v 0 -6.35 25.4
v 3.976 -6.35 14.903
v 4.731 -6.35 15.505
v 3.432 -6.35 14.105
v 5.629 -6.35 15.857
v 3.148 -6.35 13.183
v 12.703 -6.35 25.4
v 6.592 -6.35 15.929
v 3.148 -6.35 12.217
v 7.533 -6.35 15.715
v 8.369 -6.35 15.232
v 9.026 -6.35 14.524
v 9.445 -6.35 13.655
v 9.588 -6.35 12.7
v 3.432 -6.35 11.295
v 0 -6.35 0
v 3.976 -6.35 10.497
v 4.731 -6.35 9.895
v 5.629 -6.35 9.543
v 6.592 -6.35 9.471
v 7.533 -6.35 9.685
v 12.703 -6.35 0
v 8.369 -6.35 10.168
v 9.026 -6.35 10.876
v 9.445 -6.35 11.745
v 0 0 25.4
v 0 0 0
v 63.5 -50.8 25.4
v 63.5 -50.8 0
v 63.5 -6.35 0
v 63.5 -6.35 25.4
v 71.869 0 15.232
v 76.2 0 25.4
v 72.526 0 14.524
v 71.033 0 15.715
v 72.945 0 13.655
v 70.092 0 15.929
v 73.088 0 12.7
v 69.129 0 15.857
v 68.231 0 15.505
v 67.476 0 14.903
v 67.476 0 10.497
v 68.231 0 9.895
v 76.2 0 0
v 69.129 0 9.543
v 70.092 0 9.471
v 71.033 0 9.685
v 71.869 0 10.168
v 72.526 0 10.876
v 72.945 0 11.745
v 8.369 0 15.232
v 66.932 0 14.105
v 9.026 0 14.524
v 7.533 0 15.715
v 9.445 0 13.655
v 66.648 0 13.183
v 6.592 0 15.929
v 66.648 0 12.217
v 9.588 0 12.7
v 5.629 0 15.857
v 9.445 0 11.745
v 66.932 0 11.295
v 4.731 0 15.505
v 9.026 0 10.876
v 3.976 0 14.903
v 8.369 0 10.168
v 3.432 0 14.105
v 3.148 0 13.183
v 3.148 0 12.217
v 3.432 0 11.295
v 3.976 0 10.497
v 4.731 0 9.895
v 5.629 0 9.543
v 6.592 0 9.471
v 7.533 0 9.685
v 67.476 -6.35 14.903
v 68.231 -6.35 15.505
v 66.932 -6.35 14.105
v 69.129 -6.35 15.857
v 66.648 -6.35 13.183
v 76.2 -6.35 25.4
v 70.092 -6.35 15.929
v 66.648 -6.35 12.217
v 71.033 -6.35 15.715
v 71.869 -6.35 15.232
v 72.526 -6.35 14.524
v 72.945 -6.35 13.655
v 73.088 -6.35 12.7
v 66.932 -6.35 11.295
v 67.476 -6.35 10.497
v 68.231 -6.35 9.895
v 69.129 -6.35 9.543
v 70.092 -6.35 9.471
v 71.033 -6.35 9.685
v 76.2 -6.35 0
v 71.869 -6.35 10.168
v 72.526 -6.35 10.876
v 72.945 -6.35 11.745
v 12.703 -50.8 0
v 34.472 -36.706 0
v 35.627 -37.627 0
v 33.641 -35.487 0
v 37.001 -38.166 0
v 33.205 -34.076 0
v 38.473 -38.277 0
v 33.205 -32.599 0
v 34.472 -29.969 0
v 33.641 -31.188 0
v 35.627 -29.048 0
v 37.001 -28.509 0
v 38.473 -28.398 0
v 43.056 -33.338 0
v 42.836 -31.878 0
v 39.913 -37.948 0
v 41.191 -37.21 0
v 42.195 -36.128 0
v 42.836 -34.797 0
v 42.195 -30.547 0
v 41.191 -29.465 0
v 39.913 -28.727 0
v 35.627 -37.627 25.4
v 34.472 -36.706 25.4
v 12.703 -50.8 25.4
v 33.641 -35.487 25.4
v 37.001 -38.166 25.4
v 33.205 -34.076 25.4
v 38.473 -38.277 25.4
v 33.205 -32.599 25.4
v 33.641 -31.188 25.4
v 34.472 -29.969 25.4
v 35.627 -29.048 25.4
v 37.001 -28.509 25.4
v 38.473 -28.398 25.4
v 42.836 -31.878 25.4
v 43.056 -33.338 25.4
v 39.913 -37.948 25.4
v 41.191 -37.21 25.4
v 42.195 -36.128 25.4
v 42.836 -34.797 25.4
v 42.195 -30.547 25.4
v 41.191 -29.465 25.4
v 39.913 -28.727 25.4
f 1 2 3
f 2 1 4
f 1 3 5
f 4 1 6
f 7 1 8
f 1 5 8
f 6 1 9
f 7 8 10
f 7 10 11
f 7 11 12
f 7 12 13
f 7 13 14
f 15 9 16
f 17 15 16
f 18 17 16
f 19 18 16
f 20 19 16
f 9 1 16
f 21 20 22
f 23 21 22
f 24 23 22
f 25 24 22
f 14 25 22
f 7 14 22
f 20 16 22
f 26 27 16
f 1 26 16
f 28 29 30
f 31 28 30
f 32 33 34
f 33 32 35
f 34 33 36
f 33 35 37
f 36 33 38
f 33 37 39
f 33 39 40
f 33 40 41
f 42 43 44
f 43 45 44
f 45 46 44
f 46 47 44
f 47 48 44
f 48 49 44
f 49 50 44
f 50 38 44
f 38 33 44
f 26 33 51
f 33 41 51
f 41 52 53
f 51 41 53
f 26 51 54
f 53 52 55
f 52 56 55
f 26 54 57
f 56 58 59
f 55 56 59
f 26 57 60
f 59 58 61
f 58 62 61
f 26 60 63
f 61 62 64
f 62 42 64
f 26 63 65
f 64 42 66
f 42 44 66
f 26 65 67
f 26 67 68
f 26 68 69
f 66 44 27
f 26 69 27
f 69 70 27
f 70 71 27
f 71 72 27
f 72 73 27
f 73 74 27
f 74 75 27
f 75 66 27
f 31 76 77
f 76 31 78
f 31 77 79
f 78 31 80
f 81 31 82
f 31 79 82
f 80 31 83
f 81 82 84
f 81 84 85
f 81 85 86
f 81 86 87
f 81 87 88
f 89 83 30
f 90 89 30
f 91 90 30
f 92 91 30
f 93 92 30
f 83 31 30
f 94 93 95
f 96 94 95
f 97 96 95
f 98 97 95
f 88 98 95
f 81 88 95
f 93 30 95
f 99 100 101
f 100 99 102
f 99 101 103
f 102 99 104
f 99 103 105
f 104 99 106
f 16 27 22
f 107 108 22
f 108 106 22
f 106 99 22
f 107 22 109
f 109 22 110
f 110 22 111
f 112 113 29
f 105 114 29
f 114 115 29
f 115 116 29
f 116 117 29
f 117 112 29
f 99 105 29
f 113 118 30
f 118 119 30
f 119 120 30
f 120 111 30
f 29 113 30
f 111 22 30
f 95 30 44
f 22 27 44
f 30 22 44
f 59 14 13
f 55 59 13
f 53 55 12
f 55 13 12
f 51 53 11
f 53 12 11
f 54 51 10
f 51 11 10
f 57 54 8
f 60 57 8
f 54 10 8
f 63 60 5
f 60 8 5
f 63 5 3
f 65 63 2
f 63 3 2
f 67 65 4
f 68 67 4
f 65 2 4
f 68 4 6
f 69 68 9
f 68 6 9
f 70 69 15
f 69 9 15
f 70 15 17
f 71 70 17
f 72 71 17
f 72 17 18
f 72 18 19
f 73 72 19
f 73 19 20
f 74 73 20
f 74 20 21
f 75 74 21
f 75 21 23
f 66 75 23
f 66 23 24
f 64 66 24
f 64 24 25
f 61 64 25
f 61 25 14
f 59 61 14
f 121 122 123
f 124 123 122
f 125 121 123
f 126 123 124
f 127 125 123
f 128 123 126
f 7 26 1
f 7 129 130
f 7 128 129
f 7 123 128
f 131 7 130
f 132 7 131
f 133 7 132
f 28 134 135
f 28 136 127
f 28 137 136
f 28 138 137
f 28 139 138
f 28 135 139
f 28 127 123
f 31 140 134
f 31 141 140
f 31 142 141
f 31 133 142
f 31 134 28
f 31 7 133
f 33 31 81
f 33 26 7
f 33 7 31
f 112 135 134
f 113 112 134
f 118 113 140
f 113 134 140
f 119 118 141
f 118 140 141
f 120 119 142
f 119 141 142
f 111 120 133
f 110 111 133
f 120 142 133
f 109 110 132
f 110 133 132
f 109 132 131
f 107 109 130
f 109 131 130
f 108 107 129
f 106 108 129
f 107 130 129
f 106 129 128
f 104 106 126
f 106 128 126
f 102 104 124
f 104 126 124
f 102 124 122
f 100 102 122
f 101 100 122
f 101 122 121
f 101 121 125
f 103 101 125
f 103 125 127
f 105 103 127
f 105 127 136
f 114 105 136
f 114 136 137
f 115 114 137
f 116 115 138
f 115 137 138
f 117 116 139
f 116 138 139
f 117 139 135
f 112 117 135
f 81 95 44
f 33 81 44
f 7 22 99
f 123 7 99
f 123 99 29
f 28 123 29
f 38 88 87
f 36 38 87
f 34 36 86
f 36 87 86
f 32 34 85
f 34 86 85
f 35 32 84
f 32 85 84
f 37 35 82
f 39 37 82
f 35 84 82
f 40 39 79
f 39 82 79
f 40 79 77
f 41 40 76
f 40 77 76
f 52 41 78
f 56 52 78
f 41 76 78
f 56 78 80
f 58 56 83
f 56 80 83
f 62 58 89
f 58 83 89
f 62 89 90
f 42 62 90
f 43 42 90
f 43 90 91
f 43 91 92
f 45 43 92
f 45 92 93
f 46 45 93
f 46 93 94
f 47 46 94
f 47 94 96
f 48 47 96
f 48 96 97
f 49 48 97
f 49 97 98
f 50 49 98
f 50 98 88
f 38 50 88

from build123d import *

# Parameters (mm, degrees)
F1_DEPTH = 25.4
F4_R     = 3.2385
F5_DEPTH = 25.4
F3_R     = 3.2385
F6_DEPTH = 25.4
F7_R     = 4.953
F8_DEPTH = 25.4


with BuildPart() as f1:
    # F0 (on Top) → F1 (new body)
    with BuildSketch(Plane.XY):
        Polygon((76.2, 0), (0, 0), (0, -6.35), (12.703011, -6.35), (12.703011, -50.8), (63.5, -50.8), (63.5, -6.35), (76.2, -6.35), align=None)
    extrude(amount=F1_DEPTH)

    # F4 (on face) → F5 (cut)
    with BuildSketch(Plane.XZ.offset(6.35)):
        with Locations((6.35, 12.7)):
            Circle(F4_R)
    extrude(amount=-F5_DEPTH, mode=Mode.SUBTRACT)

    # F3 (on face) → F6 (cut)
    with BuildSketch(Plane.XZ.offset(6.35)):
        with Locations((69.85, 12.7)):
            Circle(F3_R)
    extrude(amount=-F6_DEPTH, mode=Mode.SUBTRACT)

    # F7 (on face) → F8 (cut)
    with BuildSketch(Plane.XY.offset(25.4)):
        with Locations((38.103011, -33.3375)):
            Circle(F7_R)
    extrude(amount=-F8_DEPTH, mode=Mode.SUBTRACT)


solid = f1.part
